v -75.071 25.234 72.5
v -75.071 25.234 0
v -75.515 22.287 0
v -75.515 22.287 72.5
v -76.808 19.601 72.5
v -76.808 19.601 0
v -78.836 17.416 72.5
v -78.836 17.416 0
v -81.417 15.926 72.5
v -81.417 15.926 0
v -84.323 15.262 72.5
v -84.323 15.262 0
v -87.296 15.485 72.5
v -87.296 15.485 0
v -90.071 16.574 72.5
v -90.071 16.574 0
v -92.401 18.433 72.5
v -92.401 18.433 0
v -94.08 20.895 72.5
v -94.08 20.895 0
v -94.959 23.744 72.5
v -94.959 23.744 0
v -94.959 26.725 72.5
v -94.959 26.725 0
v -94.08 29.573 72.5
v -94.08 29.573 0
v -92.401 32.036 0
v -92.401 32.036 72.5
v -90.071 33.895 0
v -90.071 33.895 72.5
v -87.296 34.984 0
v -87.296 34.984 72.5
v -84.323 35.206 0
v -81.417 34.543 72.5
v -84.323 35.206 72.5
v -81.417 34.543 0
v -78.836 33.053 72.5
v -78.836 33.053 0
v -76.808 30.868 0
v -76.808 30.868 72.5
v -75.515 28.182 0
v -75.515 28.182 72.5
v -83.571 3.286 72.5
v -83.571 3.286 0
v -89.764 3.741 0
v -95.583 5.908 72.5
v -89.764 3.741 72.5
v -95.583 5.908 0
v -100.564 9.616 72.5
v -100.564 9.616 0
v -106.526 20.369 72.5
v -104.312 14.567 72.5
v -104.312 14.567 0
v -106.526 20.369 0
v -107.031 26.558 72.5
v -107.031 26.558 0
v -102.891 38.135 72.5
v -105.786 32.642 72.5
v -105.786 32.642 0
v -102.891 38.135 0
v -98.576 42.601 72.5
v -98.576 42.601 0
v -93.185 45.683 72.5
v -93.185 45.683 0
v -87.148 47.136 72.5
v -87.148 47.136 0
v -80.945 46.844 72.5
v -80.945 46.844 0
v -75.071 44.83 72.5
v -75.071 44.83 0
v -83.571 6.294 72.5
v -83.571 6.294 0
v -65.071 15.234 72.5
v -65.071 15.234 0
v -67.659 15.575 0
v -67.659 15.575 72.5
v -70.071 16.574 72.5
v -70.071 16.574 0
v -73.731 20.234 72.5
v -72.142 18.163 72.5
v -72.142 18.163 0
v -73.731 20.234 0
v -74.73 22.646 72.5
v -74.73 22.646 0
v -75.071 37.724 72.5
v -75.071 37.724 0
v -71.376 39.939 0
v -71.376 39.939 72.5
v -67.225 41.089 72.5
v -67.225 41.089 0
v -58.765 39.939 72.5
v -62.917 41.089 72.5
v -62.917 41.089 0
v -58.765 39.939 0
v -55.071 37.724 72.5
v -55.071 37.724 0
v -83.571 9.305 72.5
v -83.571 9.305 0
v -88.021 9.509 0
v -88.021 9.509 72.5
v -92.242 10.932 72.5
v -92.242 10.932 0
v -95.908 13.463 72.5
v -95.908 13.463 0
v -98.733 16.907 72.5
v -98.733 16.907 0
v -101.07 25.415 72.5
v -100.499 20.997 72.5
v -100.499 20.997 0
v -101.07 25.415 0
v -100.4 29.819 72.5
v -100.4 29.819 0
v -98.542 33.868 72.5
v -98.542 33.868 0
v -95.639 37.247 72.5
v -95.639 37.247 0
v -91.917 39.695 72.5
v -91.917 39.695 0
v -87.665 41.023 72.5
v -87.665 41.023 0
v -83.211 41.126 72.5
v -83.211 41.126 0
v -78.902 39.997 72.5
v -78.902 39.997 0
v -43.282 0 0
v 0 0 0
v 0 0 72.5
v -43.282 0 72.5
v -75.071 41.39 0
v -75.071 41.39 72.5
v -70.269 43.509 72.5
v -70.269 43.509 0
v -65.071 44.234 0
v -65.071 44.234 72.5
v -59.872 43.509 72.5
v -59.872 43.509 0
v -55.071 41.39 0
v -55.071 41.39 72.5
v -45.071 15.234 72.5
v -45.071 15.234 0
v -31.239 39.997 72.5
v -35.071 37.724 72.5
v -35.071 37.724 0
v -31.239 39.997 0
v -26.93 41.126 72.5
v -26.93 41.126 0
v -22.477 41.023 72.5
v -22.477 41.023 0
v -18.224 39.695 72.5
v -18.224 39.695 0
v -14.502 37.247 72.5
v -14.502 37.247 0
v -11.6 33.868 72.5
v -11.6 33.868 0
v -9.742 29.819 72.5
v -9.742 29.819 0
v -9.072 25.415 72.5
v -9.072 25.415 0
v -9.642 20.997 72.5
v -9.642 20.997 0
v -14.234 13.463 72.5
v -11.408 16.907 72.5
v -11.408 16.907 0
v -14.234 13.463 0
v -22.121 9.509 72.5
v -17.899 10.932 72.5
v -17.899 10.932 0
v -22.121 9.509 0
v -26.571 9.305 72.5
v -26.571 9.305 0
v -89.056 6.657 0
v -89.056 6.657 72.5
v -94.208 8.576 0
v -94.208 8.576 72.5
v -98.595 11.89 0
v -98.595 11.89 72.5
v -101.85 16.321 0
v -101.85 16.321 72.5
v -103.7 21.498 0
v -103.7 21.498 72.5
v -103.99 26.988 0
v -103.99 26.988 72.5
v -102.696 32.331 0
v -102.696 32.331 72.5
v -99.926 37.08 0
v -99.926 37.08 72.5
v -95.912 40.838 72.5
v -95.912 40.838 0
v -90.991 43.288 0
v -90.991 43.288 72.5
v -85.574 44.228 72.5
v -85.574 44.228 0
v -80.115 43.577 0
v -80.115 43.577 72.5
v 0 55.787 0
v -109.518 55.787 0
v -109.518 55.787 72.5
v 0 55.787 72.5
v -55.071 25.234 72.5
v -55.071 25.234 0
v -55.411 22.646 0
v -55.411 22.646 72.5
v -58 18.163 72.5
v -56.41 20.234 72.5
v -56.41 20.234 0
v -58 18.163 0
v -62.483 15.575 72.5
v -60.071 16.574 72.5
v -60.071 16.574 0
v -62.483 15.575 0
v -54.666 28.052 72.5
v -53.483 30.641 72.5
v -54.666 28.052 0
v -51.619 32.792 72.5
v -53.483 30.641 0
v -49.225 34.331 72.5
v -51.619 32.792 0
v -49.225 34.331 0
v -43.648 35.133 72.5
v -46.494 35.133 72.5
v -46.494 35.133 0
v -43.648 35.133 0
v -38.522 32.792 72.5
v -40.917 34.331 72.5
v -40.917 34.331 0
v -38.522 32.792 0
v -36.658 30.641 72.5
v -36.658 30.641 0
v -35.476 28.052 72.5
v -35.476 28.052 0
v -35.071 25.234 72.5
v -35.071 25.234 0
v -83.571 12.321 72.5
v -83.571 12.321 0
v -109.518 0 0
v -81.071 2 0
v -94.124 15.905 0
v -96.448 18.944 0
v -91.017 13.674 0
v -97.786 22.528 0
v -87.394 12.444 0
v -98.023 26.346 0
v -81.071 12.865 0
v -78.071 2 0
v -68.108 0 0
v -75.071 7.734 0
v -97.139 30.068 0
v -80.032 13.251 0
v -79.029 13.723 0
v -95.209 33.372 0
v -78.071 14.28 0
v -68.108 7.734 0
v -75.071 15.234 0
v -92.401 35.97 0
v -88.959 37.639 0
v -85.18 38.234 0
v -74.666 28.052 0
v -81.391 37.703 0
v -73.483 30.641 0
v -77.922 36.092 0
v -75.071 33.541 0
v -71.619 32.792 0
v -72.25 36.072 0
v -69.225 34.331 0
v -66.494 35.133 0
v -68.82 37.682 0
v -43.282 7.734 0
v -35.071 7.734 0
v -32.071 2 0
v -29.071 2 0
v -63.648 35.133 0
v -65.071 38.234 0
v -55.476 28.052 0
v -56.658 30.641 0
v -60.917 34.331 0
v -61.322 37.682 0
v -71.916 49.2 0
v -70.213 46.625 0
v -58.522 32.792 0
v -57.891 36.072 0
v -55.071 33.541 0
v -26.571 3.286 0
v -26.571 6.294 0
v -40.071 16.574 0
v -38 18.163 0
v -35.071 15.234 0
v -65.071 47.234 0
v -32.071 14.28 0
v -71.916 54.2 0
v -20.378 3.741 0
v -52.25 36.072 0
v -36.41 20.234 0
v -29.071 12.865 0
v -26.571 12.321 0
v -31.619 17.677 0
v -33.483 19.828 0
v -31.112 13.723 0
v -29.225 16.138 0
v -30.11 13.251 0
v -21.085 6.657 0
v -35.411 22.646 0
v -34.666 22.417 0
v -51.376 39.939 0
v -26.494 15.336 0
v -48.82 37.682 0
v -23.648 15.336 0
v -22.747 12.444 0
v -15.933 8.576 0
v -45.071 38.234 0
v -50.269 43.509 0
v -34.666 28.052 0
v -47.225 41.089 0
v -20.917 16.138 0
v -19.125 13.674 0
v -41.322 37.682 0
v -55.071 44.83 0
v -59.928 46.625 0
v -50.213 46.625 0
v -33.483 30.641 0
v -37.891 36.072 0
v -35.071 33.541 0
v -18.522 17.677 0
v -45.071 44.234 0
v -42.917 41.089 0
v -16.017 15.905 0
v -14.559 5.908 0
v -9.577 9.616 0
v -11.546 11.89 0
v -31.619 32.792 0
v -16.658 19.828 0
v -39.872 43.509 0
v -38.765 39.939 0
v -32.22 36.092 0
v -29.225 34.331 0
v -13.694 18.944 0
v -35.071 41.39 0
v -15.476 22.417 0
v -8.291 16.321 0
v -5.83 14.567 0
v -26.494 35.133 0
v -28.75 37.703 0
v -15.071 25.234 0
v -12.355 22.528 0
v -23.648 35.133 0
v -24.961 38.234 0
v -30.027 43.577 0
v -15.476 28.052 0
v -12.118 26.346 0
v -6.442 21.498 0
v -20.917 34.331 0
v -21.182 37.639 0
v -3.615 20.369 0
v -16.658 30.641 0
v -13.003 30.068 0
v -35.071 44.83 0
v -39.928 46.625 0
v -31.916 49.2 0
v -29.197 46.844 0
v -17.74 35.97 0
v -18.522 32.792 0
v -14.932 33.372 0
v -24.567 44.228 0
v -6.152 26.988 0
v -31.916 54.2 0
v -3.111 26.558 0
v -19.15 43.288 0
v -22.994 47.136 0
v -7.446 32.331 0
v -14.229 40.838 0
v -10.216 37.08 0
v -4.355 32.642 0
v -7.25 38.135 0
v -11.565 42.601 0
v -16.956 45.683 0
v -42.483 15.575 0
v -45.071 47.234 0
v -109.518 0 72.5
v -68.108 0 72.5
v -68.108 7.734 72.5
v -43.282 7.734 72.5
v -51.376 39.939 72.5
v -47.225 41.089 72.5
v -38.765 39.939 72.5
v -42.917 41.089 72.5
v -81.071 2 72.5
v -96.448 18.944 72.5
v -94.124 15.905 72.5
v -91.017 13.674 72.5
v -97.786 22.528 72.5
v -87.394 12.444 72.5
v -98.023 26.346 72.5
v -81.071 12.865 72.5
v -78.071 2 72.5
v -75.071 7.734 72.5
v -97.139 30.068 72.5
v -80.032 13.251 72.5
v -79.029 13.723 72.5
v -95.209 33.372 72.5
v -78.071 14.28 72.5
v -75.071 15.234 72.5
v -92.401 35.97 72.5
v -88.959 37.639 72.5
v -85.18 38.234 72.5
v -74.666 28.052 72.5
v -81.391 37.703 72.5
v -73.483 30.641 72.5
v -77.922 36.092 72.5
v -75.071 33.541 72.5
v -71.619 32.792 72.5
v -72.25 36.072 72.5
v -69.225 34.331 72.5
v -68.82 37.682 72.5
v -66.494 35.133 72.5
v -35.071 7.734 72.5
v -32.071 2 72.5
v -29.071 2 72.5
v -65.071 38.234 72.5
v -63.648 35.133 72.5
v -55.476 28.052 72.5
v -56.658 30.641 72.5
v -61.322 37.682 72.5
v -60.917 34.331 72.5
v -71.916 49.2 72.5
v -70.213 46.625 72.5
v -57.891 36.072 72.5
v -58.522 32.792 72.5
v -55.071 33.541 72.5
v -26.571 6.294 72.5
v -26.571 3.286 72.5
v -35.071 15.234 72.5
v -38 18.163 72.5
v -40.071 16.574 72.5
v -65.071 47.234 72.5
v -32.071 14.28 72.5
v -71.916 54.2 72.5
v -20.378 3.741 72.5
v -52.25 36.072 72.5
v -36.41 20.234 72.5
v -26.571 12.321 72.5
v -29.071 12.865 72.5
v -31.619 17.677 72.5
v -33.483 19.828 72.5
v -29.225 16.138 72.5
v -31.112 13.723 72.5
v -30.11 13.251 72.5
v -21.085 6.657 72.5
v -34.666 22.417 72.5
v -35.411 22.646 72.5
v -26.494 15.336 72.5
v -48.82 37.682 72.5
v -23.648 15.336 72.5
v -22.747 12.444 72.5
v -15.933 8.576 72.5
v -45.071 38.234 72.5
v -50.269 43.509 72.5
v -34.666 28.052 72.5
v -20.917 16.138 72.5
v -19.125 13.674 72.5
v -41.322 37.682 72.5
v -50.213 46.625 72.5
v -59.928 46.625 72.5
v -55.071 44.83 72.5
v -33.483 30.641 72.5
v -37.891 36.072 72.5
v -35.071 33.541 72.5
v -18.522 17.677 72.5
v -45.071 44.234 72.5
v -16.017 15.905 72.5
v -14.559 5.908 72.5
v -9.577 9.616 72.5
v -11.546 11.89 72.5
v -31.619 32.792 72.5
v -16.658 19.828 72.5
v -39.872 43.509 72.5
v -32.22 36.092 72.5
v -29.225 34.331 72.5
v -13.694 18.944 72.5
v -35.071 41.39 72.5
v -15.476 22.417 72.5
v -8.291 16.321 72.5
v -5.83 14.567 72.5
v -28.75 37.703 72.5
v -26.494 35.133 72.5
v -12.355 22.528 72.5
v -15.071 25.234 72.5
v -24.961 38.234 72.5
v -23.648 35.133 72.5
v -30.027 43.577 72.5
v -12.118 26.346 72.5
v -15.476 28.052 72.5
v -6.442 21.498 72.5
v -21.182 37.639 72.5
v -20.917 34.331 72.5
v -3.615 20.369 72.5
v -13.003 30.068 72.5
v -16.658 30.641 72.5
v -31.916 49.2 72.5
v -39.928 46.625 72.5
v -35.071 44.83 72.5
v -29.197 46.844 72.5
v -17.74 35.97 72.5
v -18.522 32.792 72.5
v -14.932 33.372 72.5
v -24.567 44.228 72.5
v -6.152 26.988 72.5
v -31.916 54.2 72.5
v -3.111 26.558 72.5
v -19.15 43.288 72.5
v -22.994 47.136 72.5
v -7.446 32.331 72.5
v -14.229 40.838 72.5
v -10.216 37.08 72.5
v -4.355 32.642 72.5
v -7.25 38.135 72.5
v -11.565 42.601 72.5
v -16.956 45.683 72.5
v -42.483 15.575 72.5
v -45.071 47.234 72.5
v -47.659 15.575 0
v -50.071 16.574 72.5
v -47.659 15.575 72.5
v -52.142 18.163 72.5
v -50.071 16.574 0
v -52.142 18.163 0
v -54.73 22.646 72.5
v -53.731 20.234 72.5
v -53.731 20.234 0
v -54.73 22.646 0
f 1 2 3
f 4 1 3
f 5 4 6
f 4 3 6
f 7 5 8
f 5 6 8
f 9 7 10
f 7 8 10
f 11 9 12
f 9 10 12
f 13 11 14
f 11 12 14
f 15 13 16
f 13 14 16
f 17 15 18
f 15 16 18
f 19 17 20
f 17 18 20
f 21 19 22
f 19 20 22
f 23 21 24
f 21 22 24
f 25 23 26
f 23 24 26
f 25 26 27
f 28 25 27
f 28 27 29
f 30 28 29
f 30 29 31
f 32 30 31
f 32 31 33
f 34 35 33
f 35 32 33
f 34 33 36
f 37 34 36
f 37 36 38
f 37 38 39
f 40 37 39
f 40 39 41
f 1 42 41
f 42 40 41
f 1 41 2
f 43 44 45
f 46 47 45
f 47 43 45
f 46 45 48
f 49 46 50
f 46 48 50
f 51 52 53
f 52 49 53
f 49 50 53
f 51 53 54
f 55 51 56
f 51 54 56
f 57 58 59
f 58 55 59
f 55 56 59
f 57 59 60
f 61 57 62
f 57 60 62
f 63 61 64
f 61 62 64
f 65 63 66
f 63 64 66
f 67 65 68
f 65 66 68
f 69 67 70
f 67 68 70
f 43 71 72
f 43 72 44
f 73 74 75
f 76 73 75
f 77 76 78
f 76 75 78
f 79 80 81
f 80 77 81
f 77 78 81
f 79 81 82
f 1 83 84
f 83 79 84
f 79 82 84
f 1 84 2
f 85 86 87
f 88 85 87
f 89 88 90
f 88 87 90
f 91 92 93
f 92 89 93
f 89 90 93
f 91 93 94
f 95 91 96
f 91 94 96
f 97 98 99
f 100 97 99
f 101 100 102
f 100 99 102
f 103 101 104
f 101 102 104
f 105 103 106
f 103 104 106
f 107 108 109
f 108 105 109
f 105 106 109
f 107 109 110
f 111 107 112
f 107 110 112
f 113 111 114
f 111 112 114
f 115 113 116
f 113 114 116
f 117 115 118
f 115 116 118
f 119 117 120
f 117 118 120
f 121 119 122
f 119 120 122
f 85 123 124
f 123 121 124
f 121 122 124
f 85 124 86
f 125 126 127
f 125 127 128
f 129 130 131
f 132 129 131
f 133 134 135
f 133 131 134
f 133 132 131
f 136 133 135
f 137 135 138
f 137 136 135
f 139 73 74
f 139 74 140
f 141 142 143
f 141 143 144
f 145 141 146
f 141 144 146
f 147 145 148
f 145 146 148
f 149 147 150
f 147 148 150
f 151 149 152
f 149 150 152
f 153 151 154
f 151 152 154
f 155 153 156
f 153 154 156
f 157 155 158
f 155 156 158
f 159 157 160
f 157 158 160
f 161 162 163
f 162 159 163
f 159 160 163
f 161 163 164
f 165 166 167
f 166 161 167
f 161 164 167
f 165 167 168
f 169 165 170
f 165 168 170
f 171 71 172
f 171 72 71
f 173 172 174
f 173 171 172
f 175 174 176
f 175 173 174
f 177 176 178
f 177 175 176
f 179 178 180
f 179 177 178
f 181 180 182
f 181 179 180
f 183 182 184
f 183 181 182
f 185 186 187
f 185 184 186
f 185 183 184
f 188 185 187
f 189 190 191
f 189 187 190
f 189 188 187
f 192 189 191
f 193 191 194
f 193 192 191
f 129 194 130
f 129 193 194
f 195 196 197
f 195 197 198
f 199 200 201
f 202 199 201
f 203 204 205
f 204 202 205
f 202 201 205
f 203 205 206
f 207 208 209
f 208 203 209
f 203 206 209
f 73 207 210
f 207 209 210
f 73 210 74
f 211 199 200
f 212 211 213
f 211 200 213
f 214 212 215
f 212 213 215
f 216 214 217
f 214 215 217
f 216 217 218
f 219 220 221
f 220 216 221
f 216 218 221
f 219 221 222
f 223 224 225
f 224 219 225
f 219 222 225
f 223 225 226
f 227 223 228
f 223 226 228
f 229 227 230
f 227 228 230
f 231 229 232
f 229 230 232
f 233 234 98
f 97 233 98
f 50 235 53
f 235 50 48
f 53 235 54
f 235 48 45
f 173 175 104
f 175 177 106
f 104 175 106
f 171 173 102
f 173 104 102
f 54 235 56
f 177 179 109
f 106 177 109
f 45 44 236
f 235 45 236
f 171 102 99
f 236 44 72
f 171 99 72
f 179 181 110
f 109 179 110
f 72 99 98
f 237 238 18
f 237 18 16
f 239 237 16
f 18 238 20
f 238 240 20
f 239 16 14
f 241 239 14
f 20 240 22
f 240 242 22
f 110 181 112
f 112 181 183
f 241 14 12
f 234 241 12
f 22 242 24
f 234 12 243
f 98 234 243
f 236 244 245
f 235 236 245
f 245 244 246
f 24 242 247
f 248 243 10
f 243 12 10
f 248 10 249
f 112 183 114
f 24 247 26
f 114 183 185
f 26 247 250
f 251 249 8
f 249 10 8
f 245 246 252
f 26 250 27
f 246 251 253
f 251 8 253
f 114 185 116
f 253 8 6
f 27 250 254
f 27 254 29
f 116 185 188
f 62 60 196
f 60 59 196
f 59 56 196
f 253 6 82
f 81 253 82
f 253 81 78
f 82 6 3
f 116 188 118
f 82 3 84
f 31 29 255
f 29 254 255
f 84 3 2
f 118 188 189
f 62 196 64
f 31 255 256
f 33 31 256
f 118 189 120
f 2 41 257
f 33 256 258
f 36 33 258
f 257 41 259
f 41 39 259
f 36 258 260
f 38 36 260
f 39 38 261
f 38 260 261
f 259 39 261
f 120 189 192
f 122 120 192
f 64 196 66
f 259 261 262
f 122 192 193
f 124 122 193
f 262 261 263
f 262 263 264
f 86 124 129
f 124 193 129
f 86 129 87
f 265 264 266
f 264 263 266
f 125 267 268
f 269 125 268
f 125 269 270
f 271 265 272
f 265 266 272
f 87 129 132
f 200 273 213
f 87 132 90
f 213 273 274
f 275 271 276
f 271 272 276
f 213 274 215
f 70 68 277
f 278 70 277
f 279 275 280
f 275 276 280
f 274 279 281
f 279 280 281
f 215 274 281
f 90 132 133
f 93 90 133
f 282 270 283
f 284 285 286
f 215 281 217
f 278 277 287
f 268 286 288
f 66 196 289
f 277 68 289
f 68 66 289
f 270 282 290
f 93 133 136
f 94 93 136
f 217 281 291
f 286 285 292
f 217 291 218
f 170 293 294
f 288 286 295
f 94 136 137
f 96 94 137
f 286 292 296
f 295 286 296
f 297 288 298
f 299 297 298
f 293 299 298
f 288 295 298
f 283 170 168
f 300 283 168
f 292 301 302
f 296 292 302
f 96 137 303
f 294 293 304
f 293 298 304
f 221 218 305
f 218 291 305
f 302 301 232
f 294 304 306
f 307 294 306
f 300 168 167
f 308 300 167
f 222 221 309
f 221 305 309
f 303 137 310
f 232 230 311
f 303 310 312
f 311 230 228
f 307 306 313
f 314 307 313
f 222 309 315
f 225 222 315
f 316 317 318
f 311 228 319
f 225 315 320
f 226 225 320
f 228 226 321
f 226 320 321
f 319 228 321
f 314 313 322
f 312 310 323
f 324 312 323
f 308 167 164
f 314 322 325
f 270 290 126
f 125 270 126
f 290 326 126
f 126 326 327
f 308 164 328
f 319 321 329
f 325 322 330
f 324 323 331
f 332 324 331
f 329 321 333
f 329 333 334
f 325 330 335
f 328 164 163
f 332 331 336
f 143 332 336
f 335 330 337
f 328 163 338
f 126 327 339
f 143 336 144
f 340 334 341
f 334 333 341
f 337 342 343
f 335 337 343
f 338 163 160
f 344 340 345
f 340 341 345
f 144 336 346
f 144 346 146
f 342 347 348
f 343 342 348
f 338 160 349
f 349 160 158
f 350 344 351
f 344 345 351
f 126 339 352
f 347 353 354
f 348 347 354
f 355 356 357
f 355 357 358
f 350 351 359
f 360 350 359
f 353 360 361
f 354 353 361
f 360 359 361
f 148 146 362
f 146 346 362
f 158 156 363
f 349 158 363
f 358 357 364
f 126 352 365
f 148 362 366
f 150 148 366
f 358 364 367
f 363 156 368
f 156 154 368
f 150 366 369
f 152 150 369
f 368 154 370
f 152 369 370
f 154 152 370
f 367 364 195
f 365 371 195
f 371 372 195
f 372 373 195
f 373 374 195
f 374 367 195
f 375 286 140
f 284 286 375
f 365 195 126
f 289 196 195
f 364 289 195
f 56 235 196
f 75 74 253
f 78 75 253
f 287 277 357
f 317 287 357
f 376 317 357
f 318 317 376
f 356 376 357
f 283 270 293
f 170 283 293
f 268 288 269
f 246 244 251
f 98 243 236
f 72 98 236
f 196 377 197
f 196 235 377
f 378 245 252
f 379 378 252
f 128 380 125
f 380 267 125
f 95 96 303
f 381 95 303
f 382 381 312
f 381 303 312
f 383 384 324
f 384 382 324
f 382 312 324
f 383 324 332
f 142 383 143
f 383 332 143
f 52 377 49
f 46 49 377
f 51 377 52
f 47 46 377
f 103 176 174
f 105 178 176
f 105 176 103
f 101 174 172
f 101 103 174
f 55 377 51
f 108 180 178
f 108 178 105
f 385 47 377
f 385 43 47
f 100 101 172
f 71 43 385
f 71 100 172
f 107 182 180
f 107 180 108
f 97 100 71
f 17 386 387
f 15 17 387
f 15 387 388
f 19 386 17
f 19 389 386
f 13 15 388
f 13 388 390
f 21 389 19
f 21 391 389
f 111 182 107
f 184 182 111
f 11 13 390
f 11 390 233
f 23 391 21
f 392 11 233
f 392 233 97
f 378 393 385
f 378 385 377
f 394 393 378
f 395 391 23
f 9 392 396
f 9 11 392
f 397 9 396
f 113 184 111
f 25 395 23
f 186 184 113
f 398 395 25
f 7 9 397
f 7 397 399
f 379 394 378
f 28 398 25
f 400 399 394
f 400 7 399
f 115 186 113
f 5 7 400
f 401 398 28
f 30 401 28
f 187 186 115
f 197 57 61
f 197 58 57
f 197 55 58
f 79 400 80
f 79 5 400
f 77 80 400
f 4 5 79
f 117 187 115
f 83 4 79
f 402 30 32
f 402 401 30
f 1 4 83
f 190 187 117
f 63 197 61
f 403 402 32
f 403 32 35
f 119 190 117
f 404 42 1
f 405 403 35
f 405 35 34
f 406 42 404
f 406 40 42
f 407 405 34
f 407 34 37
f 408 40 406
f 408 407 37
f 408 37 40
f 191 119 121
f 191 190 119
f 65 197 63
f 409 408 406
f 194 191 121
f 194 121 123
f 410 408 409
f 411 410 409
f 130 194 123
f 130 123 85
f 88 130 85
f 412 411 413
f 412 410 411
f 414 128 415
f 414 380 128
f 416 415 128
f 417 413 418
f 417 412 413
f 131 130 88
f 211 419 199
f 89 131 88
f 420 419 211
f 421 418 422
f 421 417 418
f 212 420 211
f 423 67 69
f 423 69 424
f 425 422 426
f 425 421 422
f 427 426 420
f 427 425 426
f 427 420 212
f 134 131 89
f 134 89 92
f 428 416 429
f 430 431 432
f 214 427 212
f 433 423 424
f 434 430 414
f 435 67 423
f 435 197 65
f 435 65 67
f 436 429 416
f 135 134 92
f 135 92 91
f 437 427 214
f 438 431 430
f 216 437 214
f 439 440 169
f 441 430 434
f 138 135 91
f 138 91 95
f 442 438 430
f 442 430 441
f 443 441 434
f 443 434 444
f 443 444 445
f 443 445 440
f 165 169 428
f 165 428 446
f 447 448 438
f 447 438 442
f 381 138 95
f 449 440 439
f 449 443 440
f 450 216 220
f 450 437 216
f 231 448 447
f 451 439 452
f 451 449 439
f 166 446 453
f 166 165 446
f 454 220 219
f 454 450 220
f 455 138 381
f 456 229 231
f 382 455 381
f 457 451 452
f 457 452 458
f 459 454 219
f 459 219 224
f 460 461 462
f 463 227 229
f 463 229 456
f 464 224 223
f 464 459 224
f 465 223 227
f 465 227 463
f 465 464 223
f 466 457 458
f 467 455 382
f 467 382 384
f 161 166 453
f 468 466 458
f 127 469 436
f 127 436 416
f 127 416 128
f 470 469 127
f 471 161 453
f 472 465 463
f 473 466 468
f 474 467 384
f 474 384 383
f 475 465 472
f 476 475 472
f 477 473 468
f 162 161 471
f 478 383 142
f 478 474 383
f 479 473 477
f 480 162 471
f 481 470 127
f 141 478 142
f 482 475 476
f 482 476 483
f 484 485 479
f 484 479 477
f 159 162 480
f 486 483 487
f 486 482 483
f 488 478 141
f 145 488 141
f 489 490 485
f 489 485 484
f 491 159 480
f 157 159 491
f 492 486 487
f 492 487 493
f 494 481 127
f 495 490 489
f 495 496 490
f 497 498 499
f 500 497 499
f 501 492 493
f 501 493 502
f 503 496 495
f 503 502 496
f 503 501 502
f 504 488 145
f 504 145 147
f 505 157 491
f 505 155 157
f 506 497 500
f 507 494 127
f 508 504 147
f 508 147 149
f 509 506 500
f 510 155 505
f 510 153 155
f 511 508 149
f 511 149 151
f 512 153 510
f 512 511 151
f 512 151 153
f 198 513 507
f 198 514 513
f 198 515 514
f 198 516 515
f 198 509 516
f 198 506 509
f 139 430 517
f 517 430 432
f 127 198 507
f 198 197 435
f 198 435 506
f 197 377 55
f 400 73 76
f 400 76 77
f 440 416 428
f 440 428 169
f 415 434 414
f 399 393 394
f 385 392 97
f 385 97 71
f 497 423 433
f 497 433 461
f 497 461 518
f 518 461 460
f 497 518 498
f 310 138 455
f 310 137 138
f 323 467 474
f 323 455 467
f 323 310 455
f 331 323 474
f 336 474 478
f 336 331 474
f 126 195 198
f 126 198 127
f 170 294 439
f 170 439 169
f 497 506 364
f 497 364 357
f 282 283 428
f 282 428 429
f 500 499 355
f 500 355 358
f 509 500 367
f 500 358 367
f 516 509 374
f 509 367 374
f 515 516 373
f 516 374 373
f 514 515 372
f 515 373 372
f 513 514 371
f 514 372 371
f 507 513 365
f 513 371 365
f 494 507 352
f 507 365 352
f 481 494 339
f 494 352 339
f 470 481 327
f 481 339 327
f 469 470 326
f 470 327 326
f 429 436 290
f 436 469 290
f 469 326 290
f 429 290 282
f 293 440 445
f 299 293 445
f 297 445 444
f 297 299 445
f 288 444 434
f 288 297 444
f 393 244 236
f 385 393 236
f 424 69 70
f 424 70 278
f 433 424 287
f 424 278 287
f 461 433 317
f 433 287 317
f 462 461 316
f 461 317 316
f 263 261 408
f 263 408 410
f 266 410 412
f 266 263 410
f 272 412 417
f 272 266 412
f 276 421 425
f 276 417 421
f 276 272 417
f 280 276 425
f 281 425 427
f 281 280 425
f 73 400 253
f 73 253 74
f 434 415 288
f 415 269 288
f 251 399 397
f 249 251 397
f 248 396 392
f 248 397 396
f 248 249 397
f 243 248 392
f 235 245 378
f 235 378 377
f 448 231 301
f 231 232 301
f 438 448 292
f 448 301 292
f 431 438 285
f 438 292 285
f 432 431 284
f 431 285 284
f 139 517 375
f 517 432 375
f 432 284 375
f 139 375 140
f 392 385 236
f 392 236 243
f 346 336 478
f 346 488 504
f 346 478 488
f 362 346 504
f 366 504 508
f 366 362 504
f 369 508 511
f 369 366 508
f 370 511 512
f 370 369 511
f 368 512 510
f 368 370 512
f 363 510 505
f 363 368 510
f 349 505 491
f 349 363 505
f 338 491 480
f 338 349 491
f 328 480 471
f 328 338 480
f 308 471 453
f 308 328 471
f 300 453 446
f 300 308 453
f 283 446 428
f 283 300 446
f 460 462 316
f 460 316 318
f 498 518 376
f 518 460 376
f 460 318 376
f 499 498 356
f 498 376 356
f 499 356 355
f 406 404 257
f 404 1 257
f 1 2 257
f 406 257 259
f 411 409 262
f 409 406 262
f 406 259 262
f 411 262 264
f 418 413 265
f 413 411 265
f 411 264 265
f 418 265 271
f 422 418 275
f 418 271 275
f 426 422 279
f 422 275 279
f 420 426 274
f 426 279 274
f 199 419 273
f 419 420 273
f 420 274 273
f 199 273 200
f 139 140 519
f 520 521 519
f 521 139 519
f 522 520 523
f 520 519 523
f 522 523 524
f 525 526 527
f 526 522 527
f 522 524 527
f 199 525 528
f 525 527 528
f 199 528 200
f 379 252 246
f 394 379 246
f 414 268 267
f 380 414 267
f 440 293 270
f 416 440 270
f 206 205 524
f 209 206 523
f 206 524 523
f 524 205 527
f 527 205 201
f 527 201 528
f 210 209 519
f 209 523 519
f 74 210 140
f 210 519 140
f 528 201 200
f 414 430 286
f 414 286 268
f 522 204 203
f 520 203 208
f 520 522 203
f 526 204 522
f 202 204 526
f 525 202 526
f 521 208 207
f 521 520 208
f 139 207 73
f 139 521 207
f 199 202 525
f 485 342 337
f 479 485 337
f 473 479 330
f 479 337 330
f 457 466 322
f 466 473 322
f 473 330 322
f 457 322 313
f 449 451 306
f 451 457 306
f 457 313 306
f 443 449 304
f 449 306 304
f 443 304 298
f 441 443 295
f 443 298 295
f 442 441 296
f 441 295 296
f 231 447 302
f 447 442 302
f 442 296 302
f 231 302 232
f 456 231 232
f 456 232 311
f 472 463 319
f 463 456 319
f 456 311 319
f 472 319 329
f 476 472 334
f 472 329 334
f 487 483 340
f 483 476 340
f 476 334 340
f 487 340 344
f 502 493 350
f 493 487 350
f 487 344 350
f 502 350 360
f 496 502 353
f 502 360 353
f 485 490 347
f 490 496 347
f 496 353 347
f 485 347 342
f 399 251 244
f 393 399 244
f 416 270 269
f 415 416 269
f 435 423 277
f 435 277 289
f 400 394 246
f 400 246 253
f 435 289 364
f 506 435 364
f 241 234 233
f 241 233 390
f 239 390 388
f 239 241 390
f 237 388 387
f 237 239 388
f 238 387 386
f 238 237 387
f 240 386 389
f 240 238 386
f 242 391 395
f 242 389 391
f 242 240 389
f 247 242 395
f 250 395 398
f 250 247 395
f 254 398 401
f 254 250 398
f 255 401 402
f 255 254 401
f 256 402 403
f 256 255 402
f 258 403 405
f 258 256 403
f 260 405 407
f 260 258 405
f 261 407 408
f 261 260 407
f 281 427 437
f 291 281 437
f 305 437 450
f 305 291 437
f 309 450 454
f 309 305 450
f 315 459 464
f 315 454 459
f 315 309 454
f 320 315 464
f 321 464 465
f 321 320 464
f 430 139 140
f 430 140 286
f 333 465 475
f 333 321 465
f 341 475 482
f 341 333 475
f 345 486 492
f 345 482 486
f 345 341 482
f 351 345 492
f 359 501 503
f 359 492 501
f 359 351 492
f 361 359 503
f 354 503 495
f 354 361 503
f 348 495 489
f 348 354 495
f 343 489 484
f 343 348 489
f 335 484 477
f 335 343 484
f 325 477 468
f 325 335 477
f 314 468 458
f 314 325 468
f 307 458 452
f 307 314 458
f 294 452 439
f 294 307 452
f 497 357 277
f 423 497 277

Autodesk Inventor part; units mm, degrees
ref_plane "YZ Plane" through (0, 0, 0) normal (1, 0, 0) x (0, 1, 0)
ref_plane "XZ Plane" through (0, 0, 0) normal (0, 1, 0) x (-1, 0, 0)
ref_plane "XY Plane" through (0, 0, 0) normal (0, 0, 1) x (1, 0, 0)
sketch "Sketch2" plane through (0, 0, 0) normal (0, 0, 1) x (1, 0, 0)
  line L0 (0, 0) -> (-109.5178, 0)
  line L1 (-109.5178, 0) -> (-109.5178, 55.7873)
  line L2 (-109.5178, 55.7873) -> (0, 55.7873)
  line L3 (0, 55.7873) -> (0, 0)
  circle A0 centre (-85.0707, 25.2343) radius 10
  circle A1 centre (-65.0707, 25.2343) radius 10
  circle A2 centre (-45.0707, 25.2343) radius 10
  circle A3 centre (-25.0707, 25.2343) radius 10
  line L4 (-71.9158, 54.2) -> (-31.9158, 54.2)
  line L5 (-31.9158, 54.2) -> (-31.9158, 49.2)
  line L6 (-31.9158, 49.2) -> (-71.9158, 49.2)
  line L7 (-71.9158, 49.2) -> (-71.9158, 54.2)
  line L8 (-68.1085, 0) -> (-68.1085, 7.7343)
  line L9 (-68.1085, 7.7343) -> (-75.0707, 7.7343)
  line L10 (-75.0707, 7.7343) -> (-75.0707, 15.2343)
  line L11 (-75.0707, 15.2343) -> (-35.0707, 15.2343)
  line L12 (-35.0707, 15.2343) -> (-35.0707, 7.7343)
  line L13 (-35.0707, 7.7343) -> (-43.2815, 7.7343)
  line L14 (-43.2815, 7.7343) -> (-43.2815, 0)
  arc A4 (-75.0707, 33.5409) -> (-76.764, 15.2343) centre (-85.0707, 25.2343) ccw
  arc A5 (-55.0707, 33.5409) -> (-75.0707, 33.5409) centre (-65.0707, 25.2343) ccw
  arc A6 (-35.0707, 33.5409) -> (-55.0707, 33.5409) centre (-45.0707, 25.2343) ccw
  arc A7 (-33.3773, 15.2343) -> (-35.0707, 33.5409) centre (-25.0707, 25.2343) ccw
  line L15 (-76.764, 15.2343) -> (-75.0707, 15.2343)
  line L16 (-33.3773, 15.2343) -> (-35.0707, 15.2343)
  arc A8 (-75.0707, 37.7243) -> (-81.0707, 9.7424) centre (-85.0707, 25.2343) ccw
  arc A9 (-55.0707, 37.7243) -> (-75.0707, 37.7243) centre (-65.0707, 25.2343) ccw
  arc A10 (-35.0707, 37.7243) -> (-55.0707, 37.7243) centre (-45.0707, 25.2343) ccw
  arc A11 (-29.0707, 9.7424) -> (-35.0707, 37.7243) centre (-25.0707, 25.2343) ccw
  line L17 (-78.0707, 2) -> (-81.0707, 2)
  line L18 (-81.0707, 2) -> (-81.0707, 14.2799)
  line L19 (-81.0707, 14.2799) -> (-78.0707, 14.2799)
  line L20 (-78.0707, 14.2799) -> (-78.0707, 2)
  line L21 (-83.5707, 12.3211) -> (-83.5707, 3.2855)
  line L22 (-32.0707, 14.2799) -> (-29.0707, 14.2799)
  line L23 (-29.0707, 14.2799) -> (-29.0707, 2)
  line L24 (-29.0707, 2) -> (-32.0707, 2)
  line L25 (-32.0707, 2) -> (-32.0707, 14.2799)
  line L26 (-26.5707, 12.8374) -> (-26.5707, 3.2855)
  arc A12 (-75.0707, 41.3898) -> (-81.0707, 6.6601) centre (-85.0707, 25.2343) ccw
  arc A13 (-55.0707, 41.3898) -> (-75.0707, 41.3898) centre (-65.0707, 25.2343) ccw
  arc A14 (-35.0707, 41.3898) -> (-55.0707, 41.3898) centre (-45.0707, 25.2343) ccw
  arc A15 (-29.0707, 6.6601) -> (-35.0707, 41.3898) centre (-25.0707, 25.2343) ccw
  arc A16 (-75.0707, 44.8302) -> (-81.0707, 3.601) centre (-85.0707, 25.2343) ccw
  arc A17 (-55.0707, 44.8302) -> (-75.0707, 44.8302) centre (-65.0707, 25.2343) ccw
  arc A18 (-35.0707, 44.8302) -> (-55.0707, 44.8302) centre (-45.0707, 25.2343) ccw
  arc A19 (-29.0707, 3.601) -> (-35.0707, 44.8302) centre (-25.0707, 25.2343) ccw
  point P0 (-75.0707, 25.2343)
  point P1 (-55.0707, 25.2343)
  point P2 (-35.0707, 25.2343)
  point P3 (-83.5707, 9.3048)
  point P4 (-26.5707, 9.3048)
  point P5 (-26.5707, 12.3211)
  point P6 (-29.0707, 12.865)
  point P7 (-81.0707, 12.865)
  point P8 (-65.0707, 15.2343)
  point P9 (-45.0707, 15.2343)
  point P10 (-83.5707, 6.2936)
  point P11 (-26.5707, 6.2936)
  dimension "d10" = 20
  dimension "d11" = 20
  dimension "d12" = 20
  dimension "d13" = 20
  dimension "d14" = 20
  dimension "d15" = 20
  dimension "d16" = 20
  dimension "d17" = 5
  dimension "d18" = 40
  dimension "d21" = 7.5
  dimension "d22" = 40
  dimension "d23" = 3
  dimension "d24" = 3
  dimension "d25" = 3
  dimension "d26" = 3
  dimension "d27" = 1.6934
  dimension "d28" = 1.6934
  dimension "d29" = 3
  dimension "d30" = 3
  dimension "d31" = 3
  dimension "d32" = 3
  dimension "d33" = 3
  dimension "d34" = 2
  dimension "d35" = 2.5
  dimension "d36" = 3
  dimension "d37" = 3
  dimension "d38" = 3
  dimension "d39" = 2
  dimension "d40" = 2.5
  dimension "d41" = 3
  dimension "d42" = 3
  dimension "d43" = 3
  dimension "d44" = 3
  dimension "d45" = 3
  dimension "d46" = 3
  dimension "d47" = 3
  dimension "d48" = 3
extrude "Extrusion1" add sketch "Sketch2" along normal blind 72.5 contours L0 L14 L13 L12 L16 A7 L25 L24 L23 A19 A18 A17 A16 L18 L17 L20 A4 L15 L10 L9 L8 L1 L2 L3 | L11 A2 A1 L15 A4 L19 L18 A5 A6 A7 L23 L22 L16 | L11 A1 A2 | L22 L23 A7 | A4 L18 L19 | A7 L26 A11 L23 | L18 A8 L21 A4 | A11 L26 A15 L23 | L18 A12 L21 A8 | A11 A10 A9 A8 L21 A12 A13 A14 A15 L26 | A15 L26 A19 L23 | L18 A16 L21 A12
equation "\"d11\" = d10"
equation "\"d12\" = d10"
equation "\"d13\" = d10"
equation "\"d15\" = d14"
equation "\"d16\" = d14"
equation "\"d24\" = d23"
equation "\"d25\" = d23"
equation "\"d26\" = d23"
equation "\"d27\" = d28"
equation "\"d30\" = d29"
equation "\"d31\" = d29"
equation "\"d32\" = d29"
